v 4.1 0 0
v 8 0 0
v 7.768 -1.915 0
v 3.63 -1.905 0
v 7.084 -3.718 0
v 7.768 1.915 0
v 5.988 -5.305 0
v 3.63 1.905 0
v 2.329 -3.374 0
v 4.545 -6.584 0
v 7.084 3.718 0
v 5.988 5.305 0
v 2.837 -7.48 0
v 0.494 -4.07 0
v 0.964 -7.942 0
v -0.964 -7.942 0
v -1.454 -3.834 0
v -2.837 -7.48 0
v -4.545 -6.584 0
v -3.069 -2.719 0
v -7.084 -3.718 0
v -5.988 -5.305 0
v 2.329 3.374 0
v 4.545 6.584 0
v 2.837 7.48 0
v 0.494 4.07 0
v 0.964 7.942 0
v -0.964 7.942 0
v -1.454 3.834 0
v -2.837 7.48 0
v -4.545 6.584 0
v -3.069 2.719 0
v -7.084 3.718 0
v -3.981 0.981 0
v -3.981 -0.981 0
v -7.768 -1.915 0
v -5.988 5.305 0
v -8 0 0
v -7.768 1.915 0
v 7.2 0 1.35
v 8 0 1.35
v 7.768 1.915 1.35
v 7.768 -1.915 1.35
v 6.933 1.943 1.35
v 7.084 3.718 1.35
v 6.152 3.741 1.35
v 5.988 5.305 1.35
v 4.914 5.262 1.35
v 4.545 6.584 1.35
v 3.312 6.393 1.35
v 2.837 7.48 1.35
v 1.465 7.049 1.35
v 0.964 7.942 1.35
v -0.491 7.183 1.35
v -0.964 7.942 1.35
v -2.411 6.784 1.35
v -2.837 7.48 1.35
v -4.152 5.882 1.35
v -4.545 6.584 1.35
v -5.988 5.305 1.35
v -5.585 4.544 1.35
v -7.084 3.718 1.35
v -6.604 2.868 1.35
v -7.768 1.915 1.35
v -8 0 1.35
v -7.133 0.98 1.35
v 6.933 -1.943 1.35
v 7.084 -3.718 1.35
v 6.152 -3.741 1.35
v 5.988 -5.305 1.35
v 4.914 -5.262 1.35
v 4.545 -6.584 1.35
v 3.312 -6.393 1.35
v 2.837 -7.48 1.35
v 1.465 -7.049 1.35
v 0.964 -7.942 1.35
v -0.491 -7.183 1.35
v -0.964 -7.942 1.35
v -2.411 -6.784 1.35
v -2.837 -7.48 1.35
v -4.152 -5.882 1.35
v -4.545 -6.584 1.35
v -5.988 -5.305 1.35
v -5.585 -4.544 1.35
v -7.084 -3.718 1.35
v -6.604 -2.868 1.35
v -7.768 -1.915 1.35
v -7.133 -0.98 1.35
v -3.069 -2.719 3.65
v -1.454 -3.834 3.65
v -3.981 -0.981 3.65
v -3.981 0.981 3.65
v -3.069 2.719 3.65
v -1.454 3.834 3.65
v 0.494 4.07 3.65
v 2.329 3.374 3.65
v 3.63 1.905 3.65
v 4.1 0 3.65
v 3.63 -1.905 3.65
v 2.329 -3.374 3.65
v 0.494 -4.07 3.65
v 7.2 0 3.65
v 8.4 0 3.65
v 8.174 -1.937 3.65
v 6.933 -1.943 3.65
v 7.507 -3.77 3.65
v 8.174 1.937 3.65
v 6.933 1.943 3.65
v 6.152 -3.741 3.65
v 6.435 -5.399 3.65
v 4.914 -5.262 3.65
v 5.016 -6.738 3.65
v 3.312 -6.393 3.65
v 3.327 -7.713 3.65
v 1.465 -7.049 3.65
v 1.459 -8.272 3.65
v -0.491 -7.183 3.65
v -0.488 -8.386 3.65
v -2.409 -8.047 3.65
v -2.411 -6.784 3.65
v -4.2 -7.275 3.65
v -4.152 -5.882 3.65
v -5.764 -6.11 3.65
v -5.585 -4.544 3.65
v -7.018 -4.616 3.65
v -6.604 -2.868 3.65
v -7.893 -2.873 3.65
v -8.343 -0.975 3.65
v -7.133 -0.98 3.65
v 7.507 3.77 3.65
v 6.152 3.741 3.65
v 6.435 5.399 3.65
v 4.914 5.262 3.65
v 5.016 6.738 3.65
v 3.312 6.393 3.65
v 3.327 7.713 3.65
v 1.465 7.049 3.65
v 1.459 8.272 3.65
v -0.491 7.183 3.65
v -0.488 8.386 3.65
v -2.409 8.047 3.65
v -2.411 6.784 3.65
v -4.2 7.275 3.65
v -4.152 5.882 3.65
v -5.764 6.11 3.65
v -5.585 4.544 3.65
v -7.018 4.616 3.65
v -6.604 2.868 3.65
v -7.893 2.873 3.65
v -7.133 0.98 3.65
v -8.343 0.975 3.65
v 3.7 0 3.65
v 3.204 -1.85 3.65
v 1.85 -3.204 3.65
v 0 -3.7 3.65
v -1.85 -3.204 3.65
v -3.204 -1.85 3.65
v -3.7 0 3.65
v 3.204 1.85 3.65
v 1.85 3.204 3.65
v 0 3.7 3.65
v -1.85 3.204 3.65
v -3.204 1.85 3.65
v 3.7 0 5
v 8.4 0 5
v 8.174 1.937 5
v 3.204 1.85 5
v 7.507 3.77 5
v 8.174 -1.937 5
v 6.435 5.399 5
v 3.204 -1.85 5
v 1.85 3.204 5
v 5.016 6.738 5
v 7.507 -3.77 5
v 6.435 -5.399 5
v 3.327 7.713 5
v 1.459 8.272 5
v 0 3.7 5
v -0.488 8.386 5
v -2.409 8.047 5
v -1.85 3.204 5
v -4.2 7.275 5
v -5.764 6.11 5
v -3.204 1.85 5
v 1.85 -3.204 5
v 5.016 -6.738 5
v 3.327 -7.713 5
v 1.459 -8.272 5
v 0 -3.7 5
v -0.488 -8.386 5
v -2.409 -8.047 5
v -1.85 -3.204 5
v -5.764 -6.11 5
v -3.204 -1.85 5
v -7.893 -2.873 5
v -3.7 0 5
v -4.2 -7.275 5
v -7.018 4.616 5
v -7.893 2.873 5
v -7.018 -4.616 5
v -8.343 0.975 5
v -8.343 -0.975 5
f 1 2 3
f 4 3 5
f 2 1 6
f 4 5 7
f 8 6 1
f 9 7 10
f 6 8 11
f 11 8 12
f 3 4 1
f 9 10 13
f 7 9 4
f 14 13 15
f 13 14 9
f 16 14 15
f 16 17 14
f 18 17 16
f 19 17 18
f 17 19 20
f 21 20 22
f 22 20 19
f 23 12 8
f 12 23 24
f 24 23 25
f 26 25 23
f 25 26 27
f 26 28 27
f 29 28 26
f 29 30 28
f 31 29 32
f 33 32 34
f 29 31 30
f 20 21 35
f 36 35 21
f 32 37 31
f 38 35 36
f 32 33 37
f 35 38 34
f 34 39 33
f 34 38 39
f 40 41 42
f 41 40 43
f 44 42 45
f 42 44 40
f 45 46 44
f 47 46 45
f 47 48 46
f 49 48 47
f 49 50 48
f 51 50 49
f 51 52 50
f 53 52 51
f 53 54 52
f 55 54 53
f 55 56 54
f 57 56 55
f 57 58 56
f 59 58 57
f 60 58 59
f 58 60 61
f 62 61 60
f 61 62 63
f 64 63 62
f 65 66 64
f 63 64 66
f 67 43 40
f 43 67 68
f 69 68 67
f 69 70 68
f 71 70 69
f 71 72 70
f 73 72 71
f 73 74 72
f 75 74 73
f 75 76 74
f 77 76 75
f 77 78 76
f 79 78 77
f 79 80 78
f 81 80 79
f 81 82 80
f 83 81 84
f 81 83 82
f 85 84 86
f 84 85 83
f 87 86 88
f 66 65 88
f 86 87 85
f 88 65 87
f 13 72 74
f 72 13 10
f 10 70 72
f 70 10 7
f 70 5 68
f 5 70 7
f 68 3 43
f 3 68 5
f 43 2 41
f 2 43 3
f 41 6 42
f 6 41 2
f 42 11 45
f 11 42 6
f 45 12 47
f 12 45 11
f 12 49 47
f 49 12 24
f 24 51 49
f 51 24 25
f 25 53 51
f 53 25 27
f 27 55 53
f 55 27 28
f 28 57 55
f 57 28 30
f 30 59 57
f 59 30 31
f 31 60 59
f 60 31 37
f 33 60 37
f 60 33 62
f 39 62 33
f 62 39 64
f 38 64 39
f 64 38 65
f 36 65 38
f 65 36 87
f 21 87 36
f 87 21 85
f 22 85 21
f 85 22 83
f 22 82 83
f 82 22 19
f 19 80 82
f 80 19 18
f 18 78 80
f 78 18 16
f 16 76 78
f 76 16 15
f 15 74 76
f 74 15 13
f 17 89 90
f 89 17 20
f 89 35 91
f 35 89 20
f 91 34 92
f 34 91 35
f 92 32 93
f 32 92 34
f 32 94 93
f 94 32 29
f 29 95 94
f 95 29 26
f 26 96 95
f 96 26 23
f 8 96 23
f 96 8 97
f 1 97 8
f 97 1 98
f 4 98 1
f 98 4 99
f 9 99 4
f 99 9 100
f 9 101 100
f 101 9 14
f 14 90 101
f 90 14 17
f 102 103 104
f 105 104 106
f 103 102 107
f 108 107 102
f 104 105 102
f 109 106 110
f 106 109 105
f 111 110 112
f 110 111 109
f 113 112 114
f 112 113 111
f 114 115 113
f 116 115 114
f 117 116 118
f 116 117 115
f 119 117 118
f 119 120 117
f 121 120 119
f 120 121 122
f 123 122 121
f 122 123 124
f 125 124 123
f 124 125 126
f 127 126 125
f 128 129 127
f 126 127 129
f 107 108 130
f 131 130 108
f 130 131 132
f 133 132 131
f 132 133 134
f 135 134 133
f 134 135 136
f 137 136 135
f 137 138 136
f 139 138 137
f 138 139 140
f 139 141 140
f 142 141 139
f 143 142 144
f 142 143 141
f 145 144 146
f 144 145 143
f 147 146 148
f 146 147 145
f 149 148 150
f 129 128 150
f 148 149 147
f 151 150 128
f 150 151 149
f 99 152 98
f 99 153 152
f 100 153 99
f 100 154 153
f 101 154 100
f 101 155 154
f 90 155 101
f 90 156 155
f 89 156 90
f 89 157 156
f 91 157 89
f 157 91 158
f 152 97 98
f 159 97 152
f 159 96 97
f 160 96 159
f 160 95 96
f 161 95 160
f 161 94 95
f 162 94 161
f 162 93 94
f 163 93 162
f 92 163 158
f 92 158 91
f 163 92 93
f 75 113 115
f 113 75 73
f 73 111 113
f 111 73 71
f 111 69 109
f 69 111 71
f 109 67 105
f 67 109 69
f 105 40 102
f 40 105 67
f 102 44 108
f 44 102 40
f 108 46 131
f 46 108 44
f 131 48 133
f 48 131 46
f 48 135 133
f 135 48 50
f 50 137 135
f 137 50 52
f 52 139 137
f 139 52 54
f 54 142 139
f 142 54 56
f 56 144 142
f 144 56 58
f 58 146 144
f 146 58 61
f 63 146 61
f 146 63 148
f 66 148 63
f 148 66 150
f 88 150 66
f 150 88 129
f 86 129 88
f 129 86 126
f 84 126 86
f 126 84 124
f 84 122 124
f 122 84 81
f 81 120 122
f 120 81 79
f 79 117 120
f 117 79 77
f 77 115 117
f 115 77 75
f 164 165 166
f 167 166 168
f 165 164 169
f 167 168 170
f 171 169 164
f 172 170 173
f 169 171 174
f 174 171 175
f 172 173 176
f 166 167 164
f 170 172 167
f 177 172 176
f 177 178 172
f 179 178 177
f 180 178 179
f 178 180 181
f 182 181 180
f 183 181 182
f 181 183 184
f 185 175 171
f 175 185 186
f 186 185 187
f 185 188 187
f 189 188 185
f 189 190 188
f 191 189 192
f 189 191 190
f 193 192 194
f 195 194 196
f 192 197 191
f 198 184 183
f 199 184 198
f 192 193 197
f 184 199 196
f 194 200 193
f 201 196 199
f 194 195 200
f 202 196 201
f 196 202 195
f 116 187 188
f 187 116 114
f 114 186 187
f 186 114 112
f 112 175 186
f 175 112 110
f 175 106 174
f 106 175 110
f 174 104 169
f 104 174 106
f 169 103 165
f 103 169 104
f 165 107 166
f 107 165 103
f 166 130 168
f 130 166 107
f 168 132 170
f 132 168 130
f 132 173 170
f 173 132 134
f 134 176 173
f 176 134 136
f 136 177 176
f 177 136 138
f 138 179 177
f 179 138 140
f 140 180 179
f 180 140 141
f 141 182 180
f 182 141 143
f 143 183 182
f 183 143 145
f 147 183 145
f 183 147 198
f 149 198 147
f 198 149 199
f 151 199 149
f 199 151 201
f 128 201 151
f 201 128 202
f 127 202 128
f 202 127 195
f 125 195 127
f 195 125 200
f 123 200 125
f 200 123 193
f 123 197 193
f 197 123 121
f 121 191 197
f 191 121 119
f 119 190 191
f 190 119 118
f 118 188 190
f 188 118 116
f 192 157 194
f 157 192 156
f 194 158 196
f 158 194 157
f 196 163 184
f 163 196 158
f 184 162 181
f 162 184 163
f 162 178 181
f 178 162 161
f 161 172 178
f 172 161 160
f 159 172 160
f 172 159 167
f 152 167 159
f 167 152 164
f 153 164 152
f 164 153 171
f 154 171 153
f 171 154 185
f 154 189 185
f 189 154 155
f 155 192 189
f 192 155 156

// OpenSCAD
use <MCAD/2Dshapes.scad>

// THRUST BEARING f8-16m

// NOTE: this file does NOT model the bearing in all details. I only modeled
// the minumum I needed to make slots where to comfortably put the whashers

// according to the datasheets online, these bearing should have two different
// washers: one which is driven bt the outer diameter (so exactly 16mm) and
// the other driven by the bore diameter (so exatly 8mm).  However, the cheap
// ones which I have seems to have all washers of the same kind (16mm outer
// diameter, 8.2mm bore diameter).
// https://www.amazon.it/gp/product/B075F76KHN

OUTER_D = 16;
BORE_D = 8.2;
TOTAL_H = 5;
WASHER_H = 1.35;
BALL_CAGE_H = TOTAL_H - (WASHER_H*2);

function thrust_bearing_washer_h() = WASHER_H;
function thrust_bearing_ball_cage_h() = BALL_CAGE_H;
function thrust_bearing_outer_d() = OUTER_D;

module thrust_bearing_washer(tolerance=0.4) {
    inner_r = BORE_D / 2;
    outer_r = OUTER_D / 2;
    linear_extrude(WASHER_H) donutSlice(inner_r-(tolerance), outer_r+(tolerance), 0, 360);
}

module thrust_bearing_ball_cage() {
    inner_r = BORE_D / 2;
    outer_r = (OUTER_D * 0.9) / 2;
    linear_extrude(BALL_CAGE_H) donutSlice(inner_r, outer_r, 0, 360);
}

module thrust_bearing() {
    ball_h = TOTAL_H - (WASHER_H*2);
    color("grey") thrust_bearing_washer(tolerance=0);
    color("gold") translate([0, 0, WASHER_H]) thrust_bearing_ball_cage();
    color("grey") translate([0, 0, WASHER_H+BALL_CAGE_H]) thrust_bearing_washer();
}

module test_thrust_bearing_washer_slot() {
    H=4;
    difference() {
        cylinder(h=H, d=OUTER_D+4);
        translate([0, 0, -0.00001]) thrust_bearing_washer();
        translate([0, 0, H - WASHER_H +0.0001]) thrust_bearing_washer();
    }
}

//test_thrust_bearing_washer_slot();
thrust_bearing();
